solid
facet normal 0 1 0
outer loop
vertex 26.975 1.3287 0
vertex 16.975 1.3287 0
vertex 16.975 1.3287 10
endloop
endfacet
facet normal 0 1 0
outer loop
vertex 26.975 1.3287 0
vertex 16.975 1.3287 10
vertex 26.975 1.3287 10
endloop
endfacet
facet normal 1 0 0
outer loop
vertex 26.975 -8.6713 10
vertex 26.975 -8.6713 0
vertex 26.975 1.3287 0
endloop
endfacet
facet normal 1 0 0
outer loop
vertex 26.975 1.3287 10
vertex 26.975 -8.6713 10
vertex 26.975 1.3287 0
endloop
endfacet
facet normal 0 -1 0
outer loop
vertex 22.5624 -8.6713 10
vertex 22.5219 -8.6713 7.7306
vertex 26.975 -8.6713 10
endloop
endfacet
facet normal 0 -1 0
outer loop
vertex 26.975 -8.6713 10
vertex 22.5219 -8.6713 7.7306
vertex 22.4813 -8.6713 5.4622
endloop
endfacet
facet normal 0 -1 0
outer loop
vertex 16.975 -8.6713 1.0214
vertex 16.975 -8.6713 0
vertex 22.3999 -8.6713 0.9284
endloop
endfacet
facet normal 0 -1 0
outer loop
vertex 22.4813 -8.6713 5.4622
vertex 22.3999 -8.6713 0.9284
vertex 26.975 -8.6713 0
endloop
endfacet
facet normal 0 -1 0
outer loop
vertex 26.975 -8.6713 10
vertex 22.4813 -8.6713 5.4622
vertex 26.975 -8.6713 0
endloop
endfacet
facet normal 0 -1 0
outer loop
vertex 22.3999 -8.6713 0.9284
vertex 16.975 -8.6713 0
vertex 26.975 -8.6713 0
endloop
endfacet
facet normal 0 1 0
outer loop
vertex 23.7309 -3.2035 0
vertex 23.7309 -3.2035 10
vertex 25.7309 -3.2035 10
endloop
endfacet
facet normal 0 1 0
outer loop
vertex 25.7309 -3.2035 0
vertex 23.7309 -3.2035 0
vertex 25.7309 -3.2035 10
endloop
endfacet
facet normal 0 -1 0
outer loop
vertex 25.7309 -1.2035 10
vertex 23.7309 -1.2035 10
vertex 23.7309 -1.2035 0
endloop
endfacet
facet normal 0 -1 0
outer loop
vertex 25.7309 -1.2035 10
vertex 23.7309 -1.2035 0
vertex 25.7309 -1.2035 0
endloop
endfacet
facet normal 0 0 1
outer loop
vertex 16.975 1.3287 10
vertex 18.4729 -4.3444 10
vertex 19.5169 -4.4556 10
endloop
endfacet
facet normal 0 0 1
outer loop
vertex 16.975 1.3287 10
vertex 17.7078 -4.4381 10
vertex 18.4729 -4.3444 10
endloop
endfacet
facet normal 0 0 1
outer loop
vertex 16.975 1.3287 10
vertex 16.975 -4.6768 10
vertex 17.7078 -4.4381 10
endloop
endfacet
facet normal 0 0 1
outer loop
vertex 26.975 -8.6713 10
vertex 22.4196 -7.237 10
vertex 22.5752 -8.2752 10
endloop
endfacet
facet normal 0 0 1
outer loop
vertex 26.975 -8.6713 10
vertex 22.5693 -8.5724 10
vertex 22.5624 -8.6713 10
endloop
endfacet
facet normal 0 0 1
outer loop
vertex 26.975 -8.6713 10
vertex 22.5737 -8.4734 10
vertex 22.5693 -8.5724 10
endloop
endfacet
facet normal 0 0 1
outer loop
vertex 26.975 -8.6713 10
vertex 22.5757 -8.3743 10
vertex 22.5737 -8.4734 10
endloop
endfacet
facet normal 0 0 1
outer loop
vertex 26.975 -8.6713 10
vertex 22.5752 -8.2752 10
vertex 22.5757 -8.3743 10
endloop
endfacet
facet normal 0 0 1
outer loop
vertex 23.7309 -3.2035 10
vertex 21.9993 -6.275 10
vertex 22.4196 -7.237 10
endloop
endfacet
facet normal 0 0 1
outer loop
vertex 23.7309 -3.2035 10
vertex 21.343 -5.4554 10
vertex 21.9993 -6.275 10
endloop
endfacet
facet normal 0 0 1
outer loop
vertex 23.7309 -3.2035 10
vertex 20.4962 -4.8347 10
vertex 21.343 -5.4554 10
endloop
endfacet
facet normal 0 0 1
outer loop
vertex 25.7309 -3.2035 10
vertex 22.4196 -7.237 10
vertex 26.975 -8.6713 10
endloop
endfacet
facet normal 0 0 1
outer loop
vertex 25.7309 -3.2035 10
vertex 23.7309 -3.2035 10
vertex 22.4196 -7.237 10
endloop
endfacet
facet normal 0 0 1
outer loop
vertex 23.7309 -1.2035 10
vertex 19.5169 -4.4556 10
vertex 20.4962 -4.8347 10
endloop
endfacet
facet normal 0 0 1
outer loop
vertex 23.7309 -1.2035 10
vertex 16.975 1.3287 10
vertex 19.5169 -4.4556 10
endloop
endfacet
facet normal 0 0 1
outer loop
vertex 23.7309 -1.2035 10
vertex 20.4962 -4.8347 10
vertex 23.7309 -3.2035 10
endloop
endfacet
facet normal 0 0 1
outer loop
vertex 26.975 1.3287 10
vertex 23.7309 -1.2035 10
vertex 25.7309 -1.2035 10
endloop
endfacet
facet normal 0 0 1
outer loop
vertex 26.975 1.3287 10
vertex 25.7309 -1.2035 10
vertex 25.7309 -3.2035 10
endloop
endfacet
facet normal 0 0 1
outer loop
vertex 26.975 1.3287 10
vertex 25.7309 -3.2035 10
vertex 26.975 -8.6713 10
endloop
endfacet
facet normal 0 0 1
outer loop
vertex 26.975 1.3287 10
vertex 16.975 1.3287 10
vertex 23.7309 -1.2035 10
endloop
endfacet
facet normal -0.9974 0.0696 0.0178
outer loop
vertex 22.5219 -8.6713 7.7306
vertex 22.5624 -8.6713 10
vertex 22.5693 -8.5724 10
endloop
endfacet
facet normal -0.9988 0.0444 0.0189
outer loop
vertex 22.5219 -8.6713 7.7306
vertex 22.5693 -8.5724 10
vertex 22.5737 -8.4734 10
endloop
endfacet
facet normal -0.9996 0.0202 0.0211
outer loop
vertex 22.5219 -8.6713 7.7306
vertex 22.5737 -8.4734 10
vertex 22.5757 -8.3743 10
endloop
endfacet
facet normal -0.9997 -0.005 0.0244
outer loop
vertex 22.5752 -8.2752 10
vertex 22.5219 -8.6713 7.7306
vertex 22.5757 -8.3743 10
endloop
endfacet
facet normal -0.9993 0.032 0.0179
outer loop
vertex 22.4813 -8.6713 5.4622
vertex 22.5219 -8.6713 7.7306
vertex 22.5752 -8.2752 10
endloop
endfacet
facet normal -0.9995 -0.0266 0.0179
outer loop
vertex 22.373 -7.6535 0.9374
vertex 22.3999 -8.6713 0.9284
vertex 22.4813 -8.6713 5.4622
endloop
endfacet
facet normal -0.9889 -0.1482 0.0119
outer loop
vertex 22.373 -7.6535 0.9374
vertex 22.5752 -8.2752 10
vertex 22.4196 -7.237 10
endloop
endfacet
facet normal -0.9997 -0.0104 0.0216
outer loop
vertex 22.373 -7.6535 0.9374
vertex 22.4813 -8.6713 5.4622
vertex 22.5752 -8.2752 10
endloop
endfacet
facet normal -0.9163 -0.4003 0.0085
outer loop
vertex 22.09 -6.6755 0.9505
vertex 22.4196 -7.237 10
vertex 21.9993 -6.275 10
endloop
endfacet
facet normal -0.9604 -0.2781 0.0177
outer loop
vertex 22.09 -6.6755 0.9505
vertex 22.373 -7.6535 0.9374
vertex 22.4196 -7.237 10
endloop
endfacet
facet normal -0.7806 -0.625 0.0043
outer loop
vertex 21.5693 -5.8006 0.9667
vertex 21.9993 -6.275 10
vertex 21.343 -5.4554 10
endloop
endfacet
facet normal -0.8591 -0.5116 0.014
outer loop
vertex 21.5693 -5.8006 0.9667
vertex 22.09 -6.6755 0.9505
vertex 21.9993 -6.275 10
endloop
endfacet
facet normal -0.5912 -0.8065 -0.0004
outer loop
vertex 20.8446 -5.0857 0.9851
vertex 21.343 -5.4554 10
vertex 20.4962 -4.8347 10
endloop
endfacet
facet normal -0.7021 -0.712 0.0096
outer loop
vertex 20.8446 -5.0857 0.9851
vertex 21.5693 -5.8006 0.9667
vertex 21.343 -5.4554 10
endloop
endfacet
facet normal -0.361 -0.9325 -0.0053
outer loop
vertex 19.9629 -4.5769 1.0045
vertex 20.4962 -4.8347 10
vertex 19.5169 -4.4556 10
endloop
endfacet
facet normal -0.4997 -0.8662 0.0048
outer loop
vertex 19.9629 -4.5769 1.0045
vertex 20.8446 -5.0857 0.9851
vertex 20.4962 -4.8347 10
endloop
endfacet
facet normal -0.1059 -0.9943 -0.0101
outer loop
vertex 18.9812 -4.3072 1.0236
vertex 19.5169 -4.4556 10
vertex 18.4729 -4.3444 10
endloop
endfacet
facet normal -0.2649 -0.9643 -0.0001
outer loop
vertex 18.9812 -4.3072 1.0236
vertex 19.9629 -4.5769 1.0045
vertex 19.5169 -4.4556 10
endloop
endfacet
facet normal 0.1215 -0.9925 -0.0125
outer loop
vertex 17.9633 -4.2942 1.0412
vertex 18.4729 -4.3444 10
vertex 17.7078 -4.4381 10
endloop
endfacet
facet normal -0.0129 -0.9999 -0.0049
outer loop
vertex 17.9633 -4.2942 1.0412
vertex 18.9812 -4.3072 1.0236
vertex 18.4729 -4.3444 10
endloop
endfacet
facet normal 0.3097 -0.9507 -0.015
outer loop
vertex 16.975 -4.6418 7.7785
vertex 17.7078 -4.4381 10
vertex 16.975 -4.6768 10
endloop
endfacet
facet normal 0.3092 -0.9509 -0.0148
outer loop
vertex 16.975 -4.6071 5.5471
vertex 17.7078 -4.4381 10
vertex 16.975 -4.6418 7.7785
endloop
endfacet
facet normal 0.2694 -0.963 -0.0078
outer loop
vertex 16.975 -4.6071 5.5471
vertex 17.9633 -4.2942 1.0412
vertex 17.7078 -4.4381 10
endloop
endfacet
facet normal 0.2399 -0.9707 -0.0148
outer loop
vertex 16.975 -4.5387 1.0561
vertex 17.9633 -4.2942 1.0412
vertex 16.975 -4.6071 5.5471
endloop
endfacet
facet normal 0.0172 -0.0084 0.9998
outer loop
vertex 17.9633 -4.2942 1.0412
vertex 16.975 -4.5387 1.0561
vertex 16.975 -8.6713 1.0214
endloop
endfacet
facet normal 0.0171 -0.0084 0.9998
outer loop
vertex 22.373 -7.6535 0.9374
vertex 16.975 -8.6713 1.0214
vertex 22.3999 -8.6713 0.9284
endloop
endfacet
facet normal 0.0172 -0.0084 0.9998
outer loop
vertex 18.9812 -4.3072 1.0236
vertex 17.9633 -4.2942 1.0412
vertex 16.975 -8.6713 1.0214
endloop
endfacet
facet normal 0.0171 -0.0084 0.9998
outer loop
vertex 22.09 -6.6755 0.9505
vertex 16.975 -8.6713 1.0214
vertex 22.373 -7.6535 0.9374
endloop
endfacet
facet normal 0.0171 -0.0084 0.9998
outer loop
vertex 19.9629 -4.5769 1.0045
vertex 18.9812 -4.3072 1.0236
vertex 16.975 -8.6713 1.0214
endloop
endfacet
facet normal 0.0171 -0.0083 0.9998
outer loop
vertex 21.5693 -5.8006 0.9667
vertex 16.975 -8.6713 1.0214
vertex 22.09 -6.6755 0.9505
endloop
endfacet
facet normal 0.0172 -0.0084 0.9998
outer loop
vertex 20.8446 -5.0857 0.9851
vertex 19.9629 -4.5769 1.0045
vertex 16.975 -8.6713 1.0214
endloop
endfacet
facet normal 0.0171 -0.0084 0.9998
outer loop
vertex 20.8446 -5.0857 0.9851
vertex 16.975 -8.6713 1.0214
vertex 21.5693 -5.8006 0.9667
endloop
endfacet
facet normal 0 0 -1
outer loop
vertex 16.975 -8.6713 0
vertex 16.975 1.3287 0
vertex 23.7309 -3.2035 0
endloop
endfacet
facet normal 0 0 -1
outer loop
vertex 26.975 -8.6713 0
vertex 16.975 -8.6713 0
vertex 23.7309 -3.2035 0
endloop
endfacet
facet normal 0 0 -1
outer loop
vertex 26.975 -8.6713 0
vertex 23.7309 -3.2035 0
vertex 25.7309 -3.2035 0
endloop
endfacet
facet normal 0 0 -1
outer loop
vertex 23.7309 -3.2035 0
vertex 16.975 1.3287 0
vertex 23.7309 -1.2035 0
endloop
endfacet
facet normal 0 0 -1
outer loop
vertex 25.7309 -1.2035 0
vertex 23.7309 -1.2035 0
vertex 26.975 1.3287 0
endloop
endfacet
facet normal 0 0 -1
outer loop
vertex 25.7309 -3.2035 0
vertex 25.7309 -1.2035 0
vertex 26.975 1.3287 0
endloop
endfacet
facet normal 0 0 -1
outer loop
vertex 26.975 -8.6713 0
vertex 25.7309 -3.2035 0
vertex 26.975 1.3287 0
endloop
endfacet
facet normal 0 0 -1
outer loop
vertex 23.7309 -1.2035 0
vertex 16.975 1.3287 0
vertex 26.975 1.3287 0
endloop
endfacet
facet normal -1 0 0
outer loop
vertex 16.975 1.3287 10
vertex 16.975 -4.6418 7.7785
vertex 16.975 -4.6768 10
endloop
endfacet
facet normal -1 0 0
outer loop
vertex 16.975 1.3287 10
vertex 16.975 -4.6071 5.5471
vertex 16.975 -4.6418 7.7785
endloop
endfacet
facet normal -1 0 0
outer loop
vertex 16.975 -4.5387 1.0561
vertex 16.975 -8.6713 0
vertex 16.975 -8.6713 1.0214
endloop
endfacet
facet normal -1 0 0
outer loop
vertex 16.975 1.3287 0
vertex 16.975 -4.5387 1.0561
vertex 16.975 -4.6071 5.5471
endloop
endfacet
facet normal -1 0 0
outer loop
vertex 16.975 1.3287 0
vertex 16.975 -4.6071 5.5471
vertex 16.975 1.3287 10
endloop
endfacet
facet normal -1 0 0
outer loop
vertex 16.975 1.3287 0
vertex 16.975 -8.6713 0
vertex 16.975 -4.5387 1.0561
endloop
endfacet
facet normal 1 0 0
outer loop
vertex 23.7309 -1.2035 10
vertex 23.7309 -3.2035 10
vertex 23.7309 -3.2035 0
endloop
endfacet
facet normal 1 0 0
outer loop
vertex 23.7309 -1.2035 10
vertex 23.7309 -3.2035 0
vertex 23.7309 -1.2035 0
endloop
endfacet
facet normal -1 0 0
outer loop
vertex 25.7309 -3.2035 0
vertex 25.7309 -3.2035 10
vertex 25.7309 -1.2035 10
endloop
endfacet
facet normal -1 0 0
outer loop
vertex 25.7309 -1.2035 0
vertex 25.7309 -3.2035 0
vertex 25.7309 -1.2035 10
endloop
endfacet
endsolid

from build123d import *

# Parameters (mm, degrees)
BOX001_W                 = 2
BOX001_H                 = 2
BOX001_DEPTH             = 10
CYLINDER_R               = 4
CYLINDER_DEPTH           = 10
CYLINDER_ROLL_ANGLE      = 0.497253
CYLINDER_PITCH_ANGLE     = 0.973542
CYLINDER_PLACEMENT_ANGLE = 0.982028
BOX_W                    = 10
BOX_H                    = 10
BOX_DEPTH                = 10


with BuildPart() as cube001:
    # Box001 → Box001 (new body)
    with BuildSketch(Plane(origin=(23.730946, -3.203472, 0), x_dir=(1, 0, 0), z_dir=(0, 0, 1))):
        with Locations((1, 1)):
            Rectangle(BOX001_W, BOX001_H)
    extrude(amount=BOX001_DEPTH)


with BuildPart() as cylinder:
    # Cylinder → Cylinder (new body)
    with BuildSketch(Plane.XY):
        Circle(CYLINDER_R)
    extrude(amount=CYLINDER_DEPTH)


with BuildPart() as cylinder_1:
    # Cylinder roll: moved
    add(cylinder.part.rotate(Axis((0, 0, 0), (1, 0, 0)), CYLINDER_ROLL_ANGLE))


with BuildPart() as cylinder_2:
    # Cylinder pitch: moved
    add(cylinder_1.part.rotate(Axis((0, 0, 0), (0, 1, 0)), CYLINDER_PITCH_ANGLE))


with BuildPart() as cylinder_3:
    # Cylinder placement: moved
    add(cylinder_2.part.moved(Location((1, 1, 1))).rotate(Axis((1, 1, 1), (0, 0, 1)), CYLINDER_PLACEMENT_ANGLE))


with BuildPart() as cut001:
    # Box → Box (new body)
    with BuildSketch(Plane(origin=(-0.44599, 0.596456, 0), x_dir=(1, 0, 0), z_dir=(0, 0, 1))):
        with Locations((5, 5)):
            Rectangle(BOX_W, BOX_H)
    extrude(amount=BOX_DEPTH)

    # Cut: cut Cylinder
    add(cylinder_3.part, mode=Mode.SUBTRACT)


with BuildPart() as cut001_1:
    # Cut placement: moved
    add(cut001.part.moved(Location((17.420948, -9.267728, 0))))

    # Cut001: cut Cube001
    add(cube001.part, mode=Mode.SUBTRACT)


solid = cut001_1.part
